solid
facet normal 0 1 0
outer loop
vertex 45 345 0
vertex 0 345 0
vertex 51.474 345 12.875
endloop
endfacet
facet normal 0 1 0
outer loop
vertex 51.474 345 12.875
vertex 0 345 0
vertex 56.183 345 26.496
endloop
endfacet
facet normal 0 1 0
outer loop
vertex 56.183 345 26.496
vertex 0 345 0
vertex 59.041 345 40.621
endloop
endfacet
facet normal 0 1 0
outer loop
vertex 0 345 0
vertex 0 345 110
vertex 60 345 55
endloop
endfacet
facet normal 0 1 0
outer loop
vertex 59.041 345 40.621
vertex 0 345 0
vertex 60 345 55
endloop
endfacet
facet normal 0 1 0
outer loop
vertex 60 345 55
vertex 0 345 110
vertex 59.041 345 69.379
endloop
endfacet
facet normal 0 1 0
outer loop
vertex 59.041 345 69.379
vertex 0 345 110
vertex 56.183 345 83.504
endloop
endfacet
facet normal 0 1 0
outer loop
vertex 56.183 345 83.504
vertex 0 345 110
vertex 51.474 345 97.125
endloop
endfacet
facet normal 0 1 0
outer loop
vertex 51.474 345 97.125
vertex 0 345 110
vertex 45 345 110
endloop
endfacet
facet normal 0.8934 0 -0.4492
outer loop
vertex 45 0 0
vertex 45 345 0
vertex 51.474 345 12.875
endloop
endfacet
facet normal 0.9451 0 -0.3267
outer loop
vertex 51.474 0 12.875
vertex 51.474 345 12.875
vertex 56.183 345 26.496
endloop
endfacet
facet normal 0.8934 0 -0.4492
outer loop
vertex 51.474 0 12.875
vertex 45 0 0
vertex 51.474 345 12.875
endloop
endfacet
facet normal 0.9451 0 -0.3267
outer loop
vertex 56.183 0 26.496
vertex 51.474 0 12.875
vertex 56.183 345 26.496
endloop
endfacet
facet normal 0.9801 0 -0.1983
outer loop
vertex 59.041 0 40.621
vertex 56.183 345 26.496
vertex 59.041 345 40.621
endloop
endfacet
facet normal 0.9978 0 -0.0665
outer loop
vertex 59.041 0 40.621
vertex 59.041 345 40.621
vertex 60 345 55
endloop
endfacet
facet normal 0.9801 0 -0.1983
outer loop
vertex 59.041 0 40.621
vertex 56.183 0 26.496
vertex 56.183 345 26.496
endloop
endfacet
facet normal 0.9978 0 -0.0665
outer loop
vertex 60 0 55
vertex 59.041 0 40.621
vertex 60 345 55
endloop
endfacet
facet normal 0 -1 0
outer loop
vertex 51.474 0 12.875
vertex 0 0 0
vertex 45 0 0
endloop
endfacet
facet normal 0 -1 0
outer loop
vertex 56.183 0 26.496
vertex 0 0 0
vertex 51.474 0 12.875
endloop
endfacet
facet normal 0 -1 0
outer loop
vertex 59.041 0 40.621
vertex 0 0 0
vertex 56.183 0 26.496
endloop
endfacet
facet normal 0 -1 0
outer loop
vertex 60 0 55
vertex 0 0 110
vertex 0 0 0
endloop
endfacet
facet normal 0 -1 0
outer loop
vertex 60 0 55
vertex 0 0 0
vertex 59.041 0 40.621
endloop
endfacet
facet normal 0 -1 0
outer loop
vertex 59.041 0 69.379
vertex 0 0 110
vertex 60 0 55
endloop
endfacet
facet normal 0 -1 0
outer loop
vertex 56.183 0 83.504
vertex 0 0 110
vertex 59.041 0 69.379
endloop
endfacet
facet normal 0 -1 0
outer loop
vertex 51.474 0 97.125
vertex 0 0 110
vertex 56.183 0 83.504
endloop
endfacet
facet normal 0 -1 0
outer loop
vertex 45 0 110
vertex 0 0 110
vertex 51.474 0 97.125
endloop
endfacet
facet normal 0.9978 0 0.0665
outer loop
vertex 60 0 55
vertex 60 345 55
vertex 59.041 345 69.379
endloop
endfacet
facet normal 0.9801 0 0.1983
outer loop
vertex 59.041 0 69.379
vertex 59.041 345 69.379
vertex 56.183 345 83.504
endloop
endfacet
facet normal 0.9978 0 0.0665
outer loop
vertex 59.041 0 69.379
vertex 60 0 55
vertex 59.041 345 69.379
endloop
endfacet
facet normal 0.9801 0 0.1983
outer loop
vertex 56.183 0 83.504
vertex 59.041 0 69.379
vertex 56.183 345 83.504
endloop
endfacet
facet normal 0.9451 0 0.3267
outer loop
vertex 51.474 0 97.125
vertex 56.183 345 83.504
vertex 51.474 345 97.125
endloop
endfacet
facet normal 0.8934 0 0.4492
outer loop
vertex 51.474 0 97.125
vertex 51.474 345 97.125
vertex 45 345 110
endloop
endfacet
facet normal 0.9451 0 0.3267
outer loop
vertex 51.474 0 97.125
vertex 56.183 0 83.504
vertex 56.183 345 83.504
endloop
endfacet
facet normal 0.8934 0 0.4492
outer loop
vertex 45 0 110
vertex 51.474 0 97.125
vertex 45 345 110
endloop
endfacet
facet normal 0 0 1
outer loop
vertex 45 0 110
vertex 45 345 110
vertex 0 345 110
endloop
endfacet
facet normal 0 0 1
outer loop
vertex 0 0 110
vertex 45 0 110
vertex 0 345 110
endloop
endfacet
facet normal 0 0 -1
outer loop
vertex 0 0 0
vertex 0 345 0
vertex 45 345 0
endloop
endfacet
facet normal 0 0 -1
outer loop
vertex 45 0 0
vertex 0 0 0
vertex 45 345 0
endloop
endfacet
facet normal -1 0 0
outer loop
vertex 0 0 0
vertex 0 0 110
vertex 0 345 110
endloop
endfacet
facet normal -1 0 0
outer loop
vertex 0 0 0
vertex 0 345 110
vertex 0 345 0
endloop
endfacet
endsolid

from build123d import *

# Parameters (mm, degrees)
F1_DEPTH = 345


with BuildPart() as f1:
    # F0 (on Front) → F1 (new body)
    with BuildSketch(Plane.XZ):
        with BuildLine():
            Line((0, 110), (0, 55))
            Line((0, 55), (60, 55))
            ThreePointArc((60, 55), (56.182747, 83.504386), (45, 110))
            Line((45, 110), (0, 110))
        make_face()
        with BuildLine():
            Line((0, 55), (0, 0))
            Line((0, 0), (45, 0))
            ThreePointArc((45, 0), (56.182747, 26.495614), (60, 55))
            Line((60, 55), (0, 55))
        make_face()
    extrude(amount=-F1_DEPTH)


solid = f1.part
